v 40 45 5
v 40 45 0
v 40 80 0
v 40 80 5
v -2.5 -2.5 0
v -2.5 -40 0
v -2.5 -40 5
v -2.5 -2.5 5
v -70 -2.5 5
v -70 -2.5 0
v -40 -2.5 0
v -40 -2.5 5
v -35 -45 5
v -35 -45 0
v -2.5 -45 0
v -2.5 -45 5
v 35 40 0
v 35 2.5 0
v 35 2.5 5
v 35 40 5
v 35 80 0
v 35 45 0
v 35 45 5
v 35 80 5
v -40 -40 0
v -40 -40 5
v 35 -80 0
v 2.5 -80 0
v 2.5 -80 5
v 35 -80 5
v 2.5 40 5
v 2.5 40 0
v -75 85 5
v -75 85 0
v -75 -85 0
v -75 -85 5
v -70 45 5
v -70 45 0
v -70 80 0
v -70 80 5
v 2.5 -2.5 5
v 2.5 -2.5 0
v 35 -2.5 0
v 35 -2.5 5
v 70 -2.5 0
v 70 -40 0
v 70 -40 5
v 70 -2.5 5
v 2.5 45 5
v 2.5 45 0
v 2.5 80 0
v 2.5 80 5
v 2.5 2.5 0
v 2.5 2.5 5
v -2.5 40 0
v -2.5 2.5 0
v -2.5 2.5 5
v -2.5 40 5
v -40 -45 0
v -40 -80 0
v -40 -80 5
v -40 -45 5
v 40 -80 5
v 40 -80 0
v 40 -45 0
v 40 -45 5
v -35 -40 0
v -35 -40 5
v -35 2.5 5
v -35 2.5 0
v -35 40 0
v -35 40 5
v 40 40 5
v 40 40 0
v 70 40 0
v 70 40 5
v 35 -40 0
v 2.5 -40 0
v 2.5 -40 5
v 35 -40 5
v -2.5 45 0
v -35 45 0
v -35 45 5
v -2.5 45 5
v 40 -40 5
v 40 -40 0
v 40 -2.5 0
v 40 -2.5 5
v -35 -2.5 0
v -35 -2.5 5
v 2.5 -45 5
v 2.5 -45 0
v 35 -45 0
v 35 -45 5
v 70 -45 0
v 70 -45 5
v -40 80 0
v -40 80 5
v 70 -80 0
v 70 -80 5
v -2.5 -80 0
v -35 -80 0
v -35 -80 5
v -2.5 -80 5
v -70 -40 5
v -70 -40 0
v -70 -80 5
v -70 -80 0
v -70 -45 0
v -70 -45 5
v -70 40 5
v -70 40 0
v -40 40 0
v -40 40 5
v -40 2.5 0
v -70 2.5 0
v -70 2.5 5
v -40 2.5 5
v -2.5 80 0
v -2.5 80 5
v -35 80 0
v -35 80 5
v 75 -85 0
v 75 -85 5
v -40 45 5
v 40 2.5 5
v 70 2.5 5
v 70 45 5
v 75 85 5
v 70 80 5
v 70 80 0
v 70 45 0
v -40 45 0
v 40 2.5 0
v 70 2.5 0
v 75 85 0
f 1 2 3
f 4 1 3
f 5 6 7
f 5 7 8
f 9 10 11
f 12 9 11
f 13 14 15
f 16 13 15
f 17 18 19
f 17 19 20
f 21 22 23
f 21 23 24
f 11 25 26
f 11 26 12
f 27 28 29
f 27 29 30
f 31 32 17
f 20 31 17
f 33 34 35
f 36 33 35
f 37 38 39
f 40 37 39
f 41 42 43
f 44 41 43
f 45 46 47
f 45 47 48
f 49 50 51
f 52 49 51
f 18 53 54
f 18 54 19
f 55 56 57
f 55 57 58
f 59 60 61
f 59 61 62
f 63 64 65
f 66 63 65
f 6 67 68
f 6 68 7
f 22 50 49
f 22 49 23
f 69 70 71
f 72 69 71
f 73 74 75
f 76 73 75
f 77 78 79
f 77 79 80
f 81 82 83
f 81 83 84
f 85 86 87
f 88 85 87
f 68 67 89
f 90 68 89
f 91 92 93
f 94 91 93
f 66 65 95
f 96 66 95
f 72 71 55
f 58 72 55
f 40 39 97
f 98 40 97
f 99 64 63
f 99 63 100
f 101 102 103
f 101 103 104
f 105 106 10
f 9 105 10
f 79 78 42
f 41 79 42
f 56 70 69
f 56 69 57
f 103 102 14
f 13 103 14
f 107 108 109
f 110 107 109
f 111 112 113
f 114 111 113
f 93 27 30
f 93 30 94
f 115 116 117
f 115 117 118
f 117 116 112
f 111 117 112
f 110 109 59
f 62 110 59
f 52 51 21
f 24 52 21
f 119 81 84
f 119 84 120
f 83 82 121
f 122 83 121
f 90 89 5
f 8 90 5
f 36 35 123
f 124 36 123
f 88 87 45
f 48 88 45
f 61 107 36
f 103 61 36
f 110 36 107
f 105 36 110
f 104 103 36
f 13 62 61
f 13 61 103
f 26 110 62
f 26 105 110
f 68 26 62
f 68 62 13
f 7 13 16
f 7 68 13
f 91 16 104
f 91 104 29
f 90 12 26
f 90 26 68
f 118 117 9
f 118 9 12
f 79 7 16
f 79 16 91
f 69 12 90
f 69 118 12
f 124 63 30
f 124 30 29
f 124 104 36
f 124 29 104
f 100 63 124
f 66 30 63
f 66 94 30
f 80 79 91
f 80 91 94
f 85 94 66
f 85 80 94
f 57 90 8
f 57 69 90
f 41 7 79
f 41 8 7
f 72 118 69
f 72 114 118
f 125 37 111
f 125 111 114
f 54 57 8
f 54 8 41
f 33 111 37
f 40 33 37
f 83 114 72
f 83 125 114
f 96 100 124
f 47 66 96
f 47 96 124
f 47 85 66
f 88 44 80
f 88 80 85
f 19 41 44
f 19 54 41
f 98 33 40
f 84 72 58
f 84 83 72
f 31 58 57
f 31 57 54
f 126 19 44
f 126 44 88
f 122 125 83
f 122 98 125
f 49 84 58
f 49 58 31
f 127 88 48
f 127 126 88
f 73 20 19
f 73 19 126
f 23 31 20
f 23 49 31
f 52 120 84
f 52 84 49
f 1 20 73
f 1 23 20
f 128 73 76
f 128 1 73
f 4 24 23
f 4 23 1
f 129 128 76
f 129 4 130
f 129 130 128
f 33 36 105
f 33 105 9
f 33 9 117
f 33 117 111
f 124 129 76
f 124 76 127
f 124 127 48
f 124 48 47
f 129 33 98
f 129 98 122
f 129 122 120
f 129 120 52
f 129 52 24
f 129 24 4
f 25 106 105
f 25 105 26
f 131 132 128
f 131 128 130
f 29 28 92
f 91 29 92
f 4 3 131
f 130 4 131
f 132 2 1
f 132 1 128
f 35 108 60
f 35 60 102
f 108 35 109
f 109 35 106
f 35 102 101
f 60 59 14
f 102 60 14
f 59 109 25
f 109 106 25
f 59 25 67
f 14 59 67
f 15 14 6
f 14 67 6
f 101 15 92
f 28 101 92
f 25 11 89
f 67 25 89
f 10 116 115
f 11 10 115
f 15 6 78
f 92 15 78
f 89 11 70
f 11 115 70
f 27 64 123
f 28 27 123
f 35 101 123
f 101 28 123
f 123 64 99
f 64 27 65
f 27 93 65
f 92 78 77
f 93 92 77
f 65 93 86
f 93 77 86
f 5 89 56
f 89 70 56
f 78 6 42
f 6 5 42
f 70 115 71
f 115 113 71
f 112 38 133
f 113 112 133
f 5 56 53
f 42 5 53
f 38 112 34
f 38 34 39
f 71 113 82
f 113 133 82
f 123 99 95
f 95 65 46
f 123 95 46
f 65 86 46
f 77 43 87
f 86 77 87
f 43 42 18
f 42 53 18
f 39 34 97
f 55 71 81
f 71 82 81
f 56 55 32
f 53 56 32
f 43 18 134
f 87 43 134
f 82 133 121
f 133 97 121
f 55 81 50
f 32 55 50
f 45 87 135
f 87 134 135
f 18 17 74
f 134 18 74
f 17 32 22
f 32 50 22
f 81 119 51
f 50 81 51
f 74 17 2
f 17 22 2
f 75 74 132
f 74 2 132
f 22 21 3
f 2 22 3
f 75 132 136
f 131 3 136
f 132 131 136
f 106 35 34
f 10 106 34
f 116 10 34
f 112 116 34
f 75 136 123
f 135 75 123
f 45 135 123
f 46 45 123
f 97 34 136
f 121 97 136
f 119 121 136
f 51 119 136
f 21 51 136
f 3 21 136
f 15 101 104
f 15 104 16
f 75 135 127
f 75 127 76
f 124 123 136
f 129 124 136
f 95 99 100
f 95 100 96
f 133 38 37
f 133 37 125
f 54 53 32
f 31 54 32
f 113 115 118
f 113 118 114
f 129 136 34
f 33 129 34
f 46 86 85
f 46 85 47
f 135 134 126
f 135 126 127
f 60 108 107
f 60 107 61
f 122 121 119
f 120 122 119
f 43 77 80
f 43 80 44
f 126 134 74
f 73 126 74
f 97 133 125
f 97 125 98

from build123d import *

# Parameters (mm, degrees)
F0_W     = 30
F0_H     = 35
F0_W_2   = 32.5
F0_H_2   = 37.5
F1_DEPTH = 5


with BuildPart() as f1:
    # F0 (on Top) → F1 (new body)
    with BuildSketch(Plane.XY):
        Polygon((-37.5, 85), (-75, 85), (-75, 42.5), (-75, 0), (-75, -42.5), (-75, -85), (-37.5, -85), (0, -85), (37.5, -85), (75, -85), (75, -42.5), (75, 0), (75, 42.5), (75, 85), (37.5, 85), (0, 85), align=None)
        with Locations((-55, -62.5)):
            Rectangle(F0_W, F0_H, mode=Mode.SUBTRACT)
        with Locations((-18.75, -62.5)):
            Rectangle(F0_W_2, F0_H, mode=Mode.SUBTRACT)
        with Locations((-55, -21.25)):
            Rectangle(F0_W, F0_H_2, mode=Mode.SUBTRACT)
        with Locations((-18.75, -21.25)):
            Rectangle(F0_W_2, F0_H_2, mode=Mode.SUBTRACT)
        with Locations((18.75, -62.5)):
            Rectangle(F0_W_2, F0_H, mode=Mode.SUBTRACT)
        with Locations((55, -62.5)):
            Rectangle(F0_W, F0_H, mode=Mode.SUBTRACT)
        with Locations((18.75, -21.25)):
            Rectangle(F0_W_2, F0_H_2, mode=Mode.SUBTRACT)
        with Locations((55, -21.25)):
            Rectangle(F0_W, F0_H_2, mode=Mode.SUBTRACT)
        with Locations((-55, 21.25)):
            Rectangle(F0_W, F0_H_2, mode=Mode.SUBTRACT)
        with Locations((-18.75, 21.25)):
            Rectangle(F0_W_2, F0_H_2, mode=Mode.SUBTRACT)
        with Locations((-55, 62.5)):
            Rectangle(F0_W, F0_H, mode=Mode.SUBTRACT)
        with Locations((-18.75, 62.5)):
            Rectangle(F0_W_2, F0_H, mode=Mode.SUBTRACT)
        with Locations((18.75, 21.25)):
            Rectangle(F0_W_2, F0_H_2, mode=Mode.SUBTRACT)
        with Locations((55, 21.25)):
            Rectangle(F0_W, F0_H_2, mode=Mode.SUBTRACT)
        with Locations((18.75, 62.5)):
            Rectangle(F0_W_2, F0_H, mode=Mode.SUBTRACT)
        with Locations((55, 62.5)):
            Rectangle(F0_W, F0_H, mode=Mode.SUBTRACT)
    extrude(amount=F1_DEPTH)


solid = f1.part
